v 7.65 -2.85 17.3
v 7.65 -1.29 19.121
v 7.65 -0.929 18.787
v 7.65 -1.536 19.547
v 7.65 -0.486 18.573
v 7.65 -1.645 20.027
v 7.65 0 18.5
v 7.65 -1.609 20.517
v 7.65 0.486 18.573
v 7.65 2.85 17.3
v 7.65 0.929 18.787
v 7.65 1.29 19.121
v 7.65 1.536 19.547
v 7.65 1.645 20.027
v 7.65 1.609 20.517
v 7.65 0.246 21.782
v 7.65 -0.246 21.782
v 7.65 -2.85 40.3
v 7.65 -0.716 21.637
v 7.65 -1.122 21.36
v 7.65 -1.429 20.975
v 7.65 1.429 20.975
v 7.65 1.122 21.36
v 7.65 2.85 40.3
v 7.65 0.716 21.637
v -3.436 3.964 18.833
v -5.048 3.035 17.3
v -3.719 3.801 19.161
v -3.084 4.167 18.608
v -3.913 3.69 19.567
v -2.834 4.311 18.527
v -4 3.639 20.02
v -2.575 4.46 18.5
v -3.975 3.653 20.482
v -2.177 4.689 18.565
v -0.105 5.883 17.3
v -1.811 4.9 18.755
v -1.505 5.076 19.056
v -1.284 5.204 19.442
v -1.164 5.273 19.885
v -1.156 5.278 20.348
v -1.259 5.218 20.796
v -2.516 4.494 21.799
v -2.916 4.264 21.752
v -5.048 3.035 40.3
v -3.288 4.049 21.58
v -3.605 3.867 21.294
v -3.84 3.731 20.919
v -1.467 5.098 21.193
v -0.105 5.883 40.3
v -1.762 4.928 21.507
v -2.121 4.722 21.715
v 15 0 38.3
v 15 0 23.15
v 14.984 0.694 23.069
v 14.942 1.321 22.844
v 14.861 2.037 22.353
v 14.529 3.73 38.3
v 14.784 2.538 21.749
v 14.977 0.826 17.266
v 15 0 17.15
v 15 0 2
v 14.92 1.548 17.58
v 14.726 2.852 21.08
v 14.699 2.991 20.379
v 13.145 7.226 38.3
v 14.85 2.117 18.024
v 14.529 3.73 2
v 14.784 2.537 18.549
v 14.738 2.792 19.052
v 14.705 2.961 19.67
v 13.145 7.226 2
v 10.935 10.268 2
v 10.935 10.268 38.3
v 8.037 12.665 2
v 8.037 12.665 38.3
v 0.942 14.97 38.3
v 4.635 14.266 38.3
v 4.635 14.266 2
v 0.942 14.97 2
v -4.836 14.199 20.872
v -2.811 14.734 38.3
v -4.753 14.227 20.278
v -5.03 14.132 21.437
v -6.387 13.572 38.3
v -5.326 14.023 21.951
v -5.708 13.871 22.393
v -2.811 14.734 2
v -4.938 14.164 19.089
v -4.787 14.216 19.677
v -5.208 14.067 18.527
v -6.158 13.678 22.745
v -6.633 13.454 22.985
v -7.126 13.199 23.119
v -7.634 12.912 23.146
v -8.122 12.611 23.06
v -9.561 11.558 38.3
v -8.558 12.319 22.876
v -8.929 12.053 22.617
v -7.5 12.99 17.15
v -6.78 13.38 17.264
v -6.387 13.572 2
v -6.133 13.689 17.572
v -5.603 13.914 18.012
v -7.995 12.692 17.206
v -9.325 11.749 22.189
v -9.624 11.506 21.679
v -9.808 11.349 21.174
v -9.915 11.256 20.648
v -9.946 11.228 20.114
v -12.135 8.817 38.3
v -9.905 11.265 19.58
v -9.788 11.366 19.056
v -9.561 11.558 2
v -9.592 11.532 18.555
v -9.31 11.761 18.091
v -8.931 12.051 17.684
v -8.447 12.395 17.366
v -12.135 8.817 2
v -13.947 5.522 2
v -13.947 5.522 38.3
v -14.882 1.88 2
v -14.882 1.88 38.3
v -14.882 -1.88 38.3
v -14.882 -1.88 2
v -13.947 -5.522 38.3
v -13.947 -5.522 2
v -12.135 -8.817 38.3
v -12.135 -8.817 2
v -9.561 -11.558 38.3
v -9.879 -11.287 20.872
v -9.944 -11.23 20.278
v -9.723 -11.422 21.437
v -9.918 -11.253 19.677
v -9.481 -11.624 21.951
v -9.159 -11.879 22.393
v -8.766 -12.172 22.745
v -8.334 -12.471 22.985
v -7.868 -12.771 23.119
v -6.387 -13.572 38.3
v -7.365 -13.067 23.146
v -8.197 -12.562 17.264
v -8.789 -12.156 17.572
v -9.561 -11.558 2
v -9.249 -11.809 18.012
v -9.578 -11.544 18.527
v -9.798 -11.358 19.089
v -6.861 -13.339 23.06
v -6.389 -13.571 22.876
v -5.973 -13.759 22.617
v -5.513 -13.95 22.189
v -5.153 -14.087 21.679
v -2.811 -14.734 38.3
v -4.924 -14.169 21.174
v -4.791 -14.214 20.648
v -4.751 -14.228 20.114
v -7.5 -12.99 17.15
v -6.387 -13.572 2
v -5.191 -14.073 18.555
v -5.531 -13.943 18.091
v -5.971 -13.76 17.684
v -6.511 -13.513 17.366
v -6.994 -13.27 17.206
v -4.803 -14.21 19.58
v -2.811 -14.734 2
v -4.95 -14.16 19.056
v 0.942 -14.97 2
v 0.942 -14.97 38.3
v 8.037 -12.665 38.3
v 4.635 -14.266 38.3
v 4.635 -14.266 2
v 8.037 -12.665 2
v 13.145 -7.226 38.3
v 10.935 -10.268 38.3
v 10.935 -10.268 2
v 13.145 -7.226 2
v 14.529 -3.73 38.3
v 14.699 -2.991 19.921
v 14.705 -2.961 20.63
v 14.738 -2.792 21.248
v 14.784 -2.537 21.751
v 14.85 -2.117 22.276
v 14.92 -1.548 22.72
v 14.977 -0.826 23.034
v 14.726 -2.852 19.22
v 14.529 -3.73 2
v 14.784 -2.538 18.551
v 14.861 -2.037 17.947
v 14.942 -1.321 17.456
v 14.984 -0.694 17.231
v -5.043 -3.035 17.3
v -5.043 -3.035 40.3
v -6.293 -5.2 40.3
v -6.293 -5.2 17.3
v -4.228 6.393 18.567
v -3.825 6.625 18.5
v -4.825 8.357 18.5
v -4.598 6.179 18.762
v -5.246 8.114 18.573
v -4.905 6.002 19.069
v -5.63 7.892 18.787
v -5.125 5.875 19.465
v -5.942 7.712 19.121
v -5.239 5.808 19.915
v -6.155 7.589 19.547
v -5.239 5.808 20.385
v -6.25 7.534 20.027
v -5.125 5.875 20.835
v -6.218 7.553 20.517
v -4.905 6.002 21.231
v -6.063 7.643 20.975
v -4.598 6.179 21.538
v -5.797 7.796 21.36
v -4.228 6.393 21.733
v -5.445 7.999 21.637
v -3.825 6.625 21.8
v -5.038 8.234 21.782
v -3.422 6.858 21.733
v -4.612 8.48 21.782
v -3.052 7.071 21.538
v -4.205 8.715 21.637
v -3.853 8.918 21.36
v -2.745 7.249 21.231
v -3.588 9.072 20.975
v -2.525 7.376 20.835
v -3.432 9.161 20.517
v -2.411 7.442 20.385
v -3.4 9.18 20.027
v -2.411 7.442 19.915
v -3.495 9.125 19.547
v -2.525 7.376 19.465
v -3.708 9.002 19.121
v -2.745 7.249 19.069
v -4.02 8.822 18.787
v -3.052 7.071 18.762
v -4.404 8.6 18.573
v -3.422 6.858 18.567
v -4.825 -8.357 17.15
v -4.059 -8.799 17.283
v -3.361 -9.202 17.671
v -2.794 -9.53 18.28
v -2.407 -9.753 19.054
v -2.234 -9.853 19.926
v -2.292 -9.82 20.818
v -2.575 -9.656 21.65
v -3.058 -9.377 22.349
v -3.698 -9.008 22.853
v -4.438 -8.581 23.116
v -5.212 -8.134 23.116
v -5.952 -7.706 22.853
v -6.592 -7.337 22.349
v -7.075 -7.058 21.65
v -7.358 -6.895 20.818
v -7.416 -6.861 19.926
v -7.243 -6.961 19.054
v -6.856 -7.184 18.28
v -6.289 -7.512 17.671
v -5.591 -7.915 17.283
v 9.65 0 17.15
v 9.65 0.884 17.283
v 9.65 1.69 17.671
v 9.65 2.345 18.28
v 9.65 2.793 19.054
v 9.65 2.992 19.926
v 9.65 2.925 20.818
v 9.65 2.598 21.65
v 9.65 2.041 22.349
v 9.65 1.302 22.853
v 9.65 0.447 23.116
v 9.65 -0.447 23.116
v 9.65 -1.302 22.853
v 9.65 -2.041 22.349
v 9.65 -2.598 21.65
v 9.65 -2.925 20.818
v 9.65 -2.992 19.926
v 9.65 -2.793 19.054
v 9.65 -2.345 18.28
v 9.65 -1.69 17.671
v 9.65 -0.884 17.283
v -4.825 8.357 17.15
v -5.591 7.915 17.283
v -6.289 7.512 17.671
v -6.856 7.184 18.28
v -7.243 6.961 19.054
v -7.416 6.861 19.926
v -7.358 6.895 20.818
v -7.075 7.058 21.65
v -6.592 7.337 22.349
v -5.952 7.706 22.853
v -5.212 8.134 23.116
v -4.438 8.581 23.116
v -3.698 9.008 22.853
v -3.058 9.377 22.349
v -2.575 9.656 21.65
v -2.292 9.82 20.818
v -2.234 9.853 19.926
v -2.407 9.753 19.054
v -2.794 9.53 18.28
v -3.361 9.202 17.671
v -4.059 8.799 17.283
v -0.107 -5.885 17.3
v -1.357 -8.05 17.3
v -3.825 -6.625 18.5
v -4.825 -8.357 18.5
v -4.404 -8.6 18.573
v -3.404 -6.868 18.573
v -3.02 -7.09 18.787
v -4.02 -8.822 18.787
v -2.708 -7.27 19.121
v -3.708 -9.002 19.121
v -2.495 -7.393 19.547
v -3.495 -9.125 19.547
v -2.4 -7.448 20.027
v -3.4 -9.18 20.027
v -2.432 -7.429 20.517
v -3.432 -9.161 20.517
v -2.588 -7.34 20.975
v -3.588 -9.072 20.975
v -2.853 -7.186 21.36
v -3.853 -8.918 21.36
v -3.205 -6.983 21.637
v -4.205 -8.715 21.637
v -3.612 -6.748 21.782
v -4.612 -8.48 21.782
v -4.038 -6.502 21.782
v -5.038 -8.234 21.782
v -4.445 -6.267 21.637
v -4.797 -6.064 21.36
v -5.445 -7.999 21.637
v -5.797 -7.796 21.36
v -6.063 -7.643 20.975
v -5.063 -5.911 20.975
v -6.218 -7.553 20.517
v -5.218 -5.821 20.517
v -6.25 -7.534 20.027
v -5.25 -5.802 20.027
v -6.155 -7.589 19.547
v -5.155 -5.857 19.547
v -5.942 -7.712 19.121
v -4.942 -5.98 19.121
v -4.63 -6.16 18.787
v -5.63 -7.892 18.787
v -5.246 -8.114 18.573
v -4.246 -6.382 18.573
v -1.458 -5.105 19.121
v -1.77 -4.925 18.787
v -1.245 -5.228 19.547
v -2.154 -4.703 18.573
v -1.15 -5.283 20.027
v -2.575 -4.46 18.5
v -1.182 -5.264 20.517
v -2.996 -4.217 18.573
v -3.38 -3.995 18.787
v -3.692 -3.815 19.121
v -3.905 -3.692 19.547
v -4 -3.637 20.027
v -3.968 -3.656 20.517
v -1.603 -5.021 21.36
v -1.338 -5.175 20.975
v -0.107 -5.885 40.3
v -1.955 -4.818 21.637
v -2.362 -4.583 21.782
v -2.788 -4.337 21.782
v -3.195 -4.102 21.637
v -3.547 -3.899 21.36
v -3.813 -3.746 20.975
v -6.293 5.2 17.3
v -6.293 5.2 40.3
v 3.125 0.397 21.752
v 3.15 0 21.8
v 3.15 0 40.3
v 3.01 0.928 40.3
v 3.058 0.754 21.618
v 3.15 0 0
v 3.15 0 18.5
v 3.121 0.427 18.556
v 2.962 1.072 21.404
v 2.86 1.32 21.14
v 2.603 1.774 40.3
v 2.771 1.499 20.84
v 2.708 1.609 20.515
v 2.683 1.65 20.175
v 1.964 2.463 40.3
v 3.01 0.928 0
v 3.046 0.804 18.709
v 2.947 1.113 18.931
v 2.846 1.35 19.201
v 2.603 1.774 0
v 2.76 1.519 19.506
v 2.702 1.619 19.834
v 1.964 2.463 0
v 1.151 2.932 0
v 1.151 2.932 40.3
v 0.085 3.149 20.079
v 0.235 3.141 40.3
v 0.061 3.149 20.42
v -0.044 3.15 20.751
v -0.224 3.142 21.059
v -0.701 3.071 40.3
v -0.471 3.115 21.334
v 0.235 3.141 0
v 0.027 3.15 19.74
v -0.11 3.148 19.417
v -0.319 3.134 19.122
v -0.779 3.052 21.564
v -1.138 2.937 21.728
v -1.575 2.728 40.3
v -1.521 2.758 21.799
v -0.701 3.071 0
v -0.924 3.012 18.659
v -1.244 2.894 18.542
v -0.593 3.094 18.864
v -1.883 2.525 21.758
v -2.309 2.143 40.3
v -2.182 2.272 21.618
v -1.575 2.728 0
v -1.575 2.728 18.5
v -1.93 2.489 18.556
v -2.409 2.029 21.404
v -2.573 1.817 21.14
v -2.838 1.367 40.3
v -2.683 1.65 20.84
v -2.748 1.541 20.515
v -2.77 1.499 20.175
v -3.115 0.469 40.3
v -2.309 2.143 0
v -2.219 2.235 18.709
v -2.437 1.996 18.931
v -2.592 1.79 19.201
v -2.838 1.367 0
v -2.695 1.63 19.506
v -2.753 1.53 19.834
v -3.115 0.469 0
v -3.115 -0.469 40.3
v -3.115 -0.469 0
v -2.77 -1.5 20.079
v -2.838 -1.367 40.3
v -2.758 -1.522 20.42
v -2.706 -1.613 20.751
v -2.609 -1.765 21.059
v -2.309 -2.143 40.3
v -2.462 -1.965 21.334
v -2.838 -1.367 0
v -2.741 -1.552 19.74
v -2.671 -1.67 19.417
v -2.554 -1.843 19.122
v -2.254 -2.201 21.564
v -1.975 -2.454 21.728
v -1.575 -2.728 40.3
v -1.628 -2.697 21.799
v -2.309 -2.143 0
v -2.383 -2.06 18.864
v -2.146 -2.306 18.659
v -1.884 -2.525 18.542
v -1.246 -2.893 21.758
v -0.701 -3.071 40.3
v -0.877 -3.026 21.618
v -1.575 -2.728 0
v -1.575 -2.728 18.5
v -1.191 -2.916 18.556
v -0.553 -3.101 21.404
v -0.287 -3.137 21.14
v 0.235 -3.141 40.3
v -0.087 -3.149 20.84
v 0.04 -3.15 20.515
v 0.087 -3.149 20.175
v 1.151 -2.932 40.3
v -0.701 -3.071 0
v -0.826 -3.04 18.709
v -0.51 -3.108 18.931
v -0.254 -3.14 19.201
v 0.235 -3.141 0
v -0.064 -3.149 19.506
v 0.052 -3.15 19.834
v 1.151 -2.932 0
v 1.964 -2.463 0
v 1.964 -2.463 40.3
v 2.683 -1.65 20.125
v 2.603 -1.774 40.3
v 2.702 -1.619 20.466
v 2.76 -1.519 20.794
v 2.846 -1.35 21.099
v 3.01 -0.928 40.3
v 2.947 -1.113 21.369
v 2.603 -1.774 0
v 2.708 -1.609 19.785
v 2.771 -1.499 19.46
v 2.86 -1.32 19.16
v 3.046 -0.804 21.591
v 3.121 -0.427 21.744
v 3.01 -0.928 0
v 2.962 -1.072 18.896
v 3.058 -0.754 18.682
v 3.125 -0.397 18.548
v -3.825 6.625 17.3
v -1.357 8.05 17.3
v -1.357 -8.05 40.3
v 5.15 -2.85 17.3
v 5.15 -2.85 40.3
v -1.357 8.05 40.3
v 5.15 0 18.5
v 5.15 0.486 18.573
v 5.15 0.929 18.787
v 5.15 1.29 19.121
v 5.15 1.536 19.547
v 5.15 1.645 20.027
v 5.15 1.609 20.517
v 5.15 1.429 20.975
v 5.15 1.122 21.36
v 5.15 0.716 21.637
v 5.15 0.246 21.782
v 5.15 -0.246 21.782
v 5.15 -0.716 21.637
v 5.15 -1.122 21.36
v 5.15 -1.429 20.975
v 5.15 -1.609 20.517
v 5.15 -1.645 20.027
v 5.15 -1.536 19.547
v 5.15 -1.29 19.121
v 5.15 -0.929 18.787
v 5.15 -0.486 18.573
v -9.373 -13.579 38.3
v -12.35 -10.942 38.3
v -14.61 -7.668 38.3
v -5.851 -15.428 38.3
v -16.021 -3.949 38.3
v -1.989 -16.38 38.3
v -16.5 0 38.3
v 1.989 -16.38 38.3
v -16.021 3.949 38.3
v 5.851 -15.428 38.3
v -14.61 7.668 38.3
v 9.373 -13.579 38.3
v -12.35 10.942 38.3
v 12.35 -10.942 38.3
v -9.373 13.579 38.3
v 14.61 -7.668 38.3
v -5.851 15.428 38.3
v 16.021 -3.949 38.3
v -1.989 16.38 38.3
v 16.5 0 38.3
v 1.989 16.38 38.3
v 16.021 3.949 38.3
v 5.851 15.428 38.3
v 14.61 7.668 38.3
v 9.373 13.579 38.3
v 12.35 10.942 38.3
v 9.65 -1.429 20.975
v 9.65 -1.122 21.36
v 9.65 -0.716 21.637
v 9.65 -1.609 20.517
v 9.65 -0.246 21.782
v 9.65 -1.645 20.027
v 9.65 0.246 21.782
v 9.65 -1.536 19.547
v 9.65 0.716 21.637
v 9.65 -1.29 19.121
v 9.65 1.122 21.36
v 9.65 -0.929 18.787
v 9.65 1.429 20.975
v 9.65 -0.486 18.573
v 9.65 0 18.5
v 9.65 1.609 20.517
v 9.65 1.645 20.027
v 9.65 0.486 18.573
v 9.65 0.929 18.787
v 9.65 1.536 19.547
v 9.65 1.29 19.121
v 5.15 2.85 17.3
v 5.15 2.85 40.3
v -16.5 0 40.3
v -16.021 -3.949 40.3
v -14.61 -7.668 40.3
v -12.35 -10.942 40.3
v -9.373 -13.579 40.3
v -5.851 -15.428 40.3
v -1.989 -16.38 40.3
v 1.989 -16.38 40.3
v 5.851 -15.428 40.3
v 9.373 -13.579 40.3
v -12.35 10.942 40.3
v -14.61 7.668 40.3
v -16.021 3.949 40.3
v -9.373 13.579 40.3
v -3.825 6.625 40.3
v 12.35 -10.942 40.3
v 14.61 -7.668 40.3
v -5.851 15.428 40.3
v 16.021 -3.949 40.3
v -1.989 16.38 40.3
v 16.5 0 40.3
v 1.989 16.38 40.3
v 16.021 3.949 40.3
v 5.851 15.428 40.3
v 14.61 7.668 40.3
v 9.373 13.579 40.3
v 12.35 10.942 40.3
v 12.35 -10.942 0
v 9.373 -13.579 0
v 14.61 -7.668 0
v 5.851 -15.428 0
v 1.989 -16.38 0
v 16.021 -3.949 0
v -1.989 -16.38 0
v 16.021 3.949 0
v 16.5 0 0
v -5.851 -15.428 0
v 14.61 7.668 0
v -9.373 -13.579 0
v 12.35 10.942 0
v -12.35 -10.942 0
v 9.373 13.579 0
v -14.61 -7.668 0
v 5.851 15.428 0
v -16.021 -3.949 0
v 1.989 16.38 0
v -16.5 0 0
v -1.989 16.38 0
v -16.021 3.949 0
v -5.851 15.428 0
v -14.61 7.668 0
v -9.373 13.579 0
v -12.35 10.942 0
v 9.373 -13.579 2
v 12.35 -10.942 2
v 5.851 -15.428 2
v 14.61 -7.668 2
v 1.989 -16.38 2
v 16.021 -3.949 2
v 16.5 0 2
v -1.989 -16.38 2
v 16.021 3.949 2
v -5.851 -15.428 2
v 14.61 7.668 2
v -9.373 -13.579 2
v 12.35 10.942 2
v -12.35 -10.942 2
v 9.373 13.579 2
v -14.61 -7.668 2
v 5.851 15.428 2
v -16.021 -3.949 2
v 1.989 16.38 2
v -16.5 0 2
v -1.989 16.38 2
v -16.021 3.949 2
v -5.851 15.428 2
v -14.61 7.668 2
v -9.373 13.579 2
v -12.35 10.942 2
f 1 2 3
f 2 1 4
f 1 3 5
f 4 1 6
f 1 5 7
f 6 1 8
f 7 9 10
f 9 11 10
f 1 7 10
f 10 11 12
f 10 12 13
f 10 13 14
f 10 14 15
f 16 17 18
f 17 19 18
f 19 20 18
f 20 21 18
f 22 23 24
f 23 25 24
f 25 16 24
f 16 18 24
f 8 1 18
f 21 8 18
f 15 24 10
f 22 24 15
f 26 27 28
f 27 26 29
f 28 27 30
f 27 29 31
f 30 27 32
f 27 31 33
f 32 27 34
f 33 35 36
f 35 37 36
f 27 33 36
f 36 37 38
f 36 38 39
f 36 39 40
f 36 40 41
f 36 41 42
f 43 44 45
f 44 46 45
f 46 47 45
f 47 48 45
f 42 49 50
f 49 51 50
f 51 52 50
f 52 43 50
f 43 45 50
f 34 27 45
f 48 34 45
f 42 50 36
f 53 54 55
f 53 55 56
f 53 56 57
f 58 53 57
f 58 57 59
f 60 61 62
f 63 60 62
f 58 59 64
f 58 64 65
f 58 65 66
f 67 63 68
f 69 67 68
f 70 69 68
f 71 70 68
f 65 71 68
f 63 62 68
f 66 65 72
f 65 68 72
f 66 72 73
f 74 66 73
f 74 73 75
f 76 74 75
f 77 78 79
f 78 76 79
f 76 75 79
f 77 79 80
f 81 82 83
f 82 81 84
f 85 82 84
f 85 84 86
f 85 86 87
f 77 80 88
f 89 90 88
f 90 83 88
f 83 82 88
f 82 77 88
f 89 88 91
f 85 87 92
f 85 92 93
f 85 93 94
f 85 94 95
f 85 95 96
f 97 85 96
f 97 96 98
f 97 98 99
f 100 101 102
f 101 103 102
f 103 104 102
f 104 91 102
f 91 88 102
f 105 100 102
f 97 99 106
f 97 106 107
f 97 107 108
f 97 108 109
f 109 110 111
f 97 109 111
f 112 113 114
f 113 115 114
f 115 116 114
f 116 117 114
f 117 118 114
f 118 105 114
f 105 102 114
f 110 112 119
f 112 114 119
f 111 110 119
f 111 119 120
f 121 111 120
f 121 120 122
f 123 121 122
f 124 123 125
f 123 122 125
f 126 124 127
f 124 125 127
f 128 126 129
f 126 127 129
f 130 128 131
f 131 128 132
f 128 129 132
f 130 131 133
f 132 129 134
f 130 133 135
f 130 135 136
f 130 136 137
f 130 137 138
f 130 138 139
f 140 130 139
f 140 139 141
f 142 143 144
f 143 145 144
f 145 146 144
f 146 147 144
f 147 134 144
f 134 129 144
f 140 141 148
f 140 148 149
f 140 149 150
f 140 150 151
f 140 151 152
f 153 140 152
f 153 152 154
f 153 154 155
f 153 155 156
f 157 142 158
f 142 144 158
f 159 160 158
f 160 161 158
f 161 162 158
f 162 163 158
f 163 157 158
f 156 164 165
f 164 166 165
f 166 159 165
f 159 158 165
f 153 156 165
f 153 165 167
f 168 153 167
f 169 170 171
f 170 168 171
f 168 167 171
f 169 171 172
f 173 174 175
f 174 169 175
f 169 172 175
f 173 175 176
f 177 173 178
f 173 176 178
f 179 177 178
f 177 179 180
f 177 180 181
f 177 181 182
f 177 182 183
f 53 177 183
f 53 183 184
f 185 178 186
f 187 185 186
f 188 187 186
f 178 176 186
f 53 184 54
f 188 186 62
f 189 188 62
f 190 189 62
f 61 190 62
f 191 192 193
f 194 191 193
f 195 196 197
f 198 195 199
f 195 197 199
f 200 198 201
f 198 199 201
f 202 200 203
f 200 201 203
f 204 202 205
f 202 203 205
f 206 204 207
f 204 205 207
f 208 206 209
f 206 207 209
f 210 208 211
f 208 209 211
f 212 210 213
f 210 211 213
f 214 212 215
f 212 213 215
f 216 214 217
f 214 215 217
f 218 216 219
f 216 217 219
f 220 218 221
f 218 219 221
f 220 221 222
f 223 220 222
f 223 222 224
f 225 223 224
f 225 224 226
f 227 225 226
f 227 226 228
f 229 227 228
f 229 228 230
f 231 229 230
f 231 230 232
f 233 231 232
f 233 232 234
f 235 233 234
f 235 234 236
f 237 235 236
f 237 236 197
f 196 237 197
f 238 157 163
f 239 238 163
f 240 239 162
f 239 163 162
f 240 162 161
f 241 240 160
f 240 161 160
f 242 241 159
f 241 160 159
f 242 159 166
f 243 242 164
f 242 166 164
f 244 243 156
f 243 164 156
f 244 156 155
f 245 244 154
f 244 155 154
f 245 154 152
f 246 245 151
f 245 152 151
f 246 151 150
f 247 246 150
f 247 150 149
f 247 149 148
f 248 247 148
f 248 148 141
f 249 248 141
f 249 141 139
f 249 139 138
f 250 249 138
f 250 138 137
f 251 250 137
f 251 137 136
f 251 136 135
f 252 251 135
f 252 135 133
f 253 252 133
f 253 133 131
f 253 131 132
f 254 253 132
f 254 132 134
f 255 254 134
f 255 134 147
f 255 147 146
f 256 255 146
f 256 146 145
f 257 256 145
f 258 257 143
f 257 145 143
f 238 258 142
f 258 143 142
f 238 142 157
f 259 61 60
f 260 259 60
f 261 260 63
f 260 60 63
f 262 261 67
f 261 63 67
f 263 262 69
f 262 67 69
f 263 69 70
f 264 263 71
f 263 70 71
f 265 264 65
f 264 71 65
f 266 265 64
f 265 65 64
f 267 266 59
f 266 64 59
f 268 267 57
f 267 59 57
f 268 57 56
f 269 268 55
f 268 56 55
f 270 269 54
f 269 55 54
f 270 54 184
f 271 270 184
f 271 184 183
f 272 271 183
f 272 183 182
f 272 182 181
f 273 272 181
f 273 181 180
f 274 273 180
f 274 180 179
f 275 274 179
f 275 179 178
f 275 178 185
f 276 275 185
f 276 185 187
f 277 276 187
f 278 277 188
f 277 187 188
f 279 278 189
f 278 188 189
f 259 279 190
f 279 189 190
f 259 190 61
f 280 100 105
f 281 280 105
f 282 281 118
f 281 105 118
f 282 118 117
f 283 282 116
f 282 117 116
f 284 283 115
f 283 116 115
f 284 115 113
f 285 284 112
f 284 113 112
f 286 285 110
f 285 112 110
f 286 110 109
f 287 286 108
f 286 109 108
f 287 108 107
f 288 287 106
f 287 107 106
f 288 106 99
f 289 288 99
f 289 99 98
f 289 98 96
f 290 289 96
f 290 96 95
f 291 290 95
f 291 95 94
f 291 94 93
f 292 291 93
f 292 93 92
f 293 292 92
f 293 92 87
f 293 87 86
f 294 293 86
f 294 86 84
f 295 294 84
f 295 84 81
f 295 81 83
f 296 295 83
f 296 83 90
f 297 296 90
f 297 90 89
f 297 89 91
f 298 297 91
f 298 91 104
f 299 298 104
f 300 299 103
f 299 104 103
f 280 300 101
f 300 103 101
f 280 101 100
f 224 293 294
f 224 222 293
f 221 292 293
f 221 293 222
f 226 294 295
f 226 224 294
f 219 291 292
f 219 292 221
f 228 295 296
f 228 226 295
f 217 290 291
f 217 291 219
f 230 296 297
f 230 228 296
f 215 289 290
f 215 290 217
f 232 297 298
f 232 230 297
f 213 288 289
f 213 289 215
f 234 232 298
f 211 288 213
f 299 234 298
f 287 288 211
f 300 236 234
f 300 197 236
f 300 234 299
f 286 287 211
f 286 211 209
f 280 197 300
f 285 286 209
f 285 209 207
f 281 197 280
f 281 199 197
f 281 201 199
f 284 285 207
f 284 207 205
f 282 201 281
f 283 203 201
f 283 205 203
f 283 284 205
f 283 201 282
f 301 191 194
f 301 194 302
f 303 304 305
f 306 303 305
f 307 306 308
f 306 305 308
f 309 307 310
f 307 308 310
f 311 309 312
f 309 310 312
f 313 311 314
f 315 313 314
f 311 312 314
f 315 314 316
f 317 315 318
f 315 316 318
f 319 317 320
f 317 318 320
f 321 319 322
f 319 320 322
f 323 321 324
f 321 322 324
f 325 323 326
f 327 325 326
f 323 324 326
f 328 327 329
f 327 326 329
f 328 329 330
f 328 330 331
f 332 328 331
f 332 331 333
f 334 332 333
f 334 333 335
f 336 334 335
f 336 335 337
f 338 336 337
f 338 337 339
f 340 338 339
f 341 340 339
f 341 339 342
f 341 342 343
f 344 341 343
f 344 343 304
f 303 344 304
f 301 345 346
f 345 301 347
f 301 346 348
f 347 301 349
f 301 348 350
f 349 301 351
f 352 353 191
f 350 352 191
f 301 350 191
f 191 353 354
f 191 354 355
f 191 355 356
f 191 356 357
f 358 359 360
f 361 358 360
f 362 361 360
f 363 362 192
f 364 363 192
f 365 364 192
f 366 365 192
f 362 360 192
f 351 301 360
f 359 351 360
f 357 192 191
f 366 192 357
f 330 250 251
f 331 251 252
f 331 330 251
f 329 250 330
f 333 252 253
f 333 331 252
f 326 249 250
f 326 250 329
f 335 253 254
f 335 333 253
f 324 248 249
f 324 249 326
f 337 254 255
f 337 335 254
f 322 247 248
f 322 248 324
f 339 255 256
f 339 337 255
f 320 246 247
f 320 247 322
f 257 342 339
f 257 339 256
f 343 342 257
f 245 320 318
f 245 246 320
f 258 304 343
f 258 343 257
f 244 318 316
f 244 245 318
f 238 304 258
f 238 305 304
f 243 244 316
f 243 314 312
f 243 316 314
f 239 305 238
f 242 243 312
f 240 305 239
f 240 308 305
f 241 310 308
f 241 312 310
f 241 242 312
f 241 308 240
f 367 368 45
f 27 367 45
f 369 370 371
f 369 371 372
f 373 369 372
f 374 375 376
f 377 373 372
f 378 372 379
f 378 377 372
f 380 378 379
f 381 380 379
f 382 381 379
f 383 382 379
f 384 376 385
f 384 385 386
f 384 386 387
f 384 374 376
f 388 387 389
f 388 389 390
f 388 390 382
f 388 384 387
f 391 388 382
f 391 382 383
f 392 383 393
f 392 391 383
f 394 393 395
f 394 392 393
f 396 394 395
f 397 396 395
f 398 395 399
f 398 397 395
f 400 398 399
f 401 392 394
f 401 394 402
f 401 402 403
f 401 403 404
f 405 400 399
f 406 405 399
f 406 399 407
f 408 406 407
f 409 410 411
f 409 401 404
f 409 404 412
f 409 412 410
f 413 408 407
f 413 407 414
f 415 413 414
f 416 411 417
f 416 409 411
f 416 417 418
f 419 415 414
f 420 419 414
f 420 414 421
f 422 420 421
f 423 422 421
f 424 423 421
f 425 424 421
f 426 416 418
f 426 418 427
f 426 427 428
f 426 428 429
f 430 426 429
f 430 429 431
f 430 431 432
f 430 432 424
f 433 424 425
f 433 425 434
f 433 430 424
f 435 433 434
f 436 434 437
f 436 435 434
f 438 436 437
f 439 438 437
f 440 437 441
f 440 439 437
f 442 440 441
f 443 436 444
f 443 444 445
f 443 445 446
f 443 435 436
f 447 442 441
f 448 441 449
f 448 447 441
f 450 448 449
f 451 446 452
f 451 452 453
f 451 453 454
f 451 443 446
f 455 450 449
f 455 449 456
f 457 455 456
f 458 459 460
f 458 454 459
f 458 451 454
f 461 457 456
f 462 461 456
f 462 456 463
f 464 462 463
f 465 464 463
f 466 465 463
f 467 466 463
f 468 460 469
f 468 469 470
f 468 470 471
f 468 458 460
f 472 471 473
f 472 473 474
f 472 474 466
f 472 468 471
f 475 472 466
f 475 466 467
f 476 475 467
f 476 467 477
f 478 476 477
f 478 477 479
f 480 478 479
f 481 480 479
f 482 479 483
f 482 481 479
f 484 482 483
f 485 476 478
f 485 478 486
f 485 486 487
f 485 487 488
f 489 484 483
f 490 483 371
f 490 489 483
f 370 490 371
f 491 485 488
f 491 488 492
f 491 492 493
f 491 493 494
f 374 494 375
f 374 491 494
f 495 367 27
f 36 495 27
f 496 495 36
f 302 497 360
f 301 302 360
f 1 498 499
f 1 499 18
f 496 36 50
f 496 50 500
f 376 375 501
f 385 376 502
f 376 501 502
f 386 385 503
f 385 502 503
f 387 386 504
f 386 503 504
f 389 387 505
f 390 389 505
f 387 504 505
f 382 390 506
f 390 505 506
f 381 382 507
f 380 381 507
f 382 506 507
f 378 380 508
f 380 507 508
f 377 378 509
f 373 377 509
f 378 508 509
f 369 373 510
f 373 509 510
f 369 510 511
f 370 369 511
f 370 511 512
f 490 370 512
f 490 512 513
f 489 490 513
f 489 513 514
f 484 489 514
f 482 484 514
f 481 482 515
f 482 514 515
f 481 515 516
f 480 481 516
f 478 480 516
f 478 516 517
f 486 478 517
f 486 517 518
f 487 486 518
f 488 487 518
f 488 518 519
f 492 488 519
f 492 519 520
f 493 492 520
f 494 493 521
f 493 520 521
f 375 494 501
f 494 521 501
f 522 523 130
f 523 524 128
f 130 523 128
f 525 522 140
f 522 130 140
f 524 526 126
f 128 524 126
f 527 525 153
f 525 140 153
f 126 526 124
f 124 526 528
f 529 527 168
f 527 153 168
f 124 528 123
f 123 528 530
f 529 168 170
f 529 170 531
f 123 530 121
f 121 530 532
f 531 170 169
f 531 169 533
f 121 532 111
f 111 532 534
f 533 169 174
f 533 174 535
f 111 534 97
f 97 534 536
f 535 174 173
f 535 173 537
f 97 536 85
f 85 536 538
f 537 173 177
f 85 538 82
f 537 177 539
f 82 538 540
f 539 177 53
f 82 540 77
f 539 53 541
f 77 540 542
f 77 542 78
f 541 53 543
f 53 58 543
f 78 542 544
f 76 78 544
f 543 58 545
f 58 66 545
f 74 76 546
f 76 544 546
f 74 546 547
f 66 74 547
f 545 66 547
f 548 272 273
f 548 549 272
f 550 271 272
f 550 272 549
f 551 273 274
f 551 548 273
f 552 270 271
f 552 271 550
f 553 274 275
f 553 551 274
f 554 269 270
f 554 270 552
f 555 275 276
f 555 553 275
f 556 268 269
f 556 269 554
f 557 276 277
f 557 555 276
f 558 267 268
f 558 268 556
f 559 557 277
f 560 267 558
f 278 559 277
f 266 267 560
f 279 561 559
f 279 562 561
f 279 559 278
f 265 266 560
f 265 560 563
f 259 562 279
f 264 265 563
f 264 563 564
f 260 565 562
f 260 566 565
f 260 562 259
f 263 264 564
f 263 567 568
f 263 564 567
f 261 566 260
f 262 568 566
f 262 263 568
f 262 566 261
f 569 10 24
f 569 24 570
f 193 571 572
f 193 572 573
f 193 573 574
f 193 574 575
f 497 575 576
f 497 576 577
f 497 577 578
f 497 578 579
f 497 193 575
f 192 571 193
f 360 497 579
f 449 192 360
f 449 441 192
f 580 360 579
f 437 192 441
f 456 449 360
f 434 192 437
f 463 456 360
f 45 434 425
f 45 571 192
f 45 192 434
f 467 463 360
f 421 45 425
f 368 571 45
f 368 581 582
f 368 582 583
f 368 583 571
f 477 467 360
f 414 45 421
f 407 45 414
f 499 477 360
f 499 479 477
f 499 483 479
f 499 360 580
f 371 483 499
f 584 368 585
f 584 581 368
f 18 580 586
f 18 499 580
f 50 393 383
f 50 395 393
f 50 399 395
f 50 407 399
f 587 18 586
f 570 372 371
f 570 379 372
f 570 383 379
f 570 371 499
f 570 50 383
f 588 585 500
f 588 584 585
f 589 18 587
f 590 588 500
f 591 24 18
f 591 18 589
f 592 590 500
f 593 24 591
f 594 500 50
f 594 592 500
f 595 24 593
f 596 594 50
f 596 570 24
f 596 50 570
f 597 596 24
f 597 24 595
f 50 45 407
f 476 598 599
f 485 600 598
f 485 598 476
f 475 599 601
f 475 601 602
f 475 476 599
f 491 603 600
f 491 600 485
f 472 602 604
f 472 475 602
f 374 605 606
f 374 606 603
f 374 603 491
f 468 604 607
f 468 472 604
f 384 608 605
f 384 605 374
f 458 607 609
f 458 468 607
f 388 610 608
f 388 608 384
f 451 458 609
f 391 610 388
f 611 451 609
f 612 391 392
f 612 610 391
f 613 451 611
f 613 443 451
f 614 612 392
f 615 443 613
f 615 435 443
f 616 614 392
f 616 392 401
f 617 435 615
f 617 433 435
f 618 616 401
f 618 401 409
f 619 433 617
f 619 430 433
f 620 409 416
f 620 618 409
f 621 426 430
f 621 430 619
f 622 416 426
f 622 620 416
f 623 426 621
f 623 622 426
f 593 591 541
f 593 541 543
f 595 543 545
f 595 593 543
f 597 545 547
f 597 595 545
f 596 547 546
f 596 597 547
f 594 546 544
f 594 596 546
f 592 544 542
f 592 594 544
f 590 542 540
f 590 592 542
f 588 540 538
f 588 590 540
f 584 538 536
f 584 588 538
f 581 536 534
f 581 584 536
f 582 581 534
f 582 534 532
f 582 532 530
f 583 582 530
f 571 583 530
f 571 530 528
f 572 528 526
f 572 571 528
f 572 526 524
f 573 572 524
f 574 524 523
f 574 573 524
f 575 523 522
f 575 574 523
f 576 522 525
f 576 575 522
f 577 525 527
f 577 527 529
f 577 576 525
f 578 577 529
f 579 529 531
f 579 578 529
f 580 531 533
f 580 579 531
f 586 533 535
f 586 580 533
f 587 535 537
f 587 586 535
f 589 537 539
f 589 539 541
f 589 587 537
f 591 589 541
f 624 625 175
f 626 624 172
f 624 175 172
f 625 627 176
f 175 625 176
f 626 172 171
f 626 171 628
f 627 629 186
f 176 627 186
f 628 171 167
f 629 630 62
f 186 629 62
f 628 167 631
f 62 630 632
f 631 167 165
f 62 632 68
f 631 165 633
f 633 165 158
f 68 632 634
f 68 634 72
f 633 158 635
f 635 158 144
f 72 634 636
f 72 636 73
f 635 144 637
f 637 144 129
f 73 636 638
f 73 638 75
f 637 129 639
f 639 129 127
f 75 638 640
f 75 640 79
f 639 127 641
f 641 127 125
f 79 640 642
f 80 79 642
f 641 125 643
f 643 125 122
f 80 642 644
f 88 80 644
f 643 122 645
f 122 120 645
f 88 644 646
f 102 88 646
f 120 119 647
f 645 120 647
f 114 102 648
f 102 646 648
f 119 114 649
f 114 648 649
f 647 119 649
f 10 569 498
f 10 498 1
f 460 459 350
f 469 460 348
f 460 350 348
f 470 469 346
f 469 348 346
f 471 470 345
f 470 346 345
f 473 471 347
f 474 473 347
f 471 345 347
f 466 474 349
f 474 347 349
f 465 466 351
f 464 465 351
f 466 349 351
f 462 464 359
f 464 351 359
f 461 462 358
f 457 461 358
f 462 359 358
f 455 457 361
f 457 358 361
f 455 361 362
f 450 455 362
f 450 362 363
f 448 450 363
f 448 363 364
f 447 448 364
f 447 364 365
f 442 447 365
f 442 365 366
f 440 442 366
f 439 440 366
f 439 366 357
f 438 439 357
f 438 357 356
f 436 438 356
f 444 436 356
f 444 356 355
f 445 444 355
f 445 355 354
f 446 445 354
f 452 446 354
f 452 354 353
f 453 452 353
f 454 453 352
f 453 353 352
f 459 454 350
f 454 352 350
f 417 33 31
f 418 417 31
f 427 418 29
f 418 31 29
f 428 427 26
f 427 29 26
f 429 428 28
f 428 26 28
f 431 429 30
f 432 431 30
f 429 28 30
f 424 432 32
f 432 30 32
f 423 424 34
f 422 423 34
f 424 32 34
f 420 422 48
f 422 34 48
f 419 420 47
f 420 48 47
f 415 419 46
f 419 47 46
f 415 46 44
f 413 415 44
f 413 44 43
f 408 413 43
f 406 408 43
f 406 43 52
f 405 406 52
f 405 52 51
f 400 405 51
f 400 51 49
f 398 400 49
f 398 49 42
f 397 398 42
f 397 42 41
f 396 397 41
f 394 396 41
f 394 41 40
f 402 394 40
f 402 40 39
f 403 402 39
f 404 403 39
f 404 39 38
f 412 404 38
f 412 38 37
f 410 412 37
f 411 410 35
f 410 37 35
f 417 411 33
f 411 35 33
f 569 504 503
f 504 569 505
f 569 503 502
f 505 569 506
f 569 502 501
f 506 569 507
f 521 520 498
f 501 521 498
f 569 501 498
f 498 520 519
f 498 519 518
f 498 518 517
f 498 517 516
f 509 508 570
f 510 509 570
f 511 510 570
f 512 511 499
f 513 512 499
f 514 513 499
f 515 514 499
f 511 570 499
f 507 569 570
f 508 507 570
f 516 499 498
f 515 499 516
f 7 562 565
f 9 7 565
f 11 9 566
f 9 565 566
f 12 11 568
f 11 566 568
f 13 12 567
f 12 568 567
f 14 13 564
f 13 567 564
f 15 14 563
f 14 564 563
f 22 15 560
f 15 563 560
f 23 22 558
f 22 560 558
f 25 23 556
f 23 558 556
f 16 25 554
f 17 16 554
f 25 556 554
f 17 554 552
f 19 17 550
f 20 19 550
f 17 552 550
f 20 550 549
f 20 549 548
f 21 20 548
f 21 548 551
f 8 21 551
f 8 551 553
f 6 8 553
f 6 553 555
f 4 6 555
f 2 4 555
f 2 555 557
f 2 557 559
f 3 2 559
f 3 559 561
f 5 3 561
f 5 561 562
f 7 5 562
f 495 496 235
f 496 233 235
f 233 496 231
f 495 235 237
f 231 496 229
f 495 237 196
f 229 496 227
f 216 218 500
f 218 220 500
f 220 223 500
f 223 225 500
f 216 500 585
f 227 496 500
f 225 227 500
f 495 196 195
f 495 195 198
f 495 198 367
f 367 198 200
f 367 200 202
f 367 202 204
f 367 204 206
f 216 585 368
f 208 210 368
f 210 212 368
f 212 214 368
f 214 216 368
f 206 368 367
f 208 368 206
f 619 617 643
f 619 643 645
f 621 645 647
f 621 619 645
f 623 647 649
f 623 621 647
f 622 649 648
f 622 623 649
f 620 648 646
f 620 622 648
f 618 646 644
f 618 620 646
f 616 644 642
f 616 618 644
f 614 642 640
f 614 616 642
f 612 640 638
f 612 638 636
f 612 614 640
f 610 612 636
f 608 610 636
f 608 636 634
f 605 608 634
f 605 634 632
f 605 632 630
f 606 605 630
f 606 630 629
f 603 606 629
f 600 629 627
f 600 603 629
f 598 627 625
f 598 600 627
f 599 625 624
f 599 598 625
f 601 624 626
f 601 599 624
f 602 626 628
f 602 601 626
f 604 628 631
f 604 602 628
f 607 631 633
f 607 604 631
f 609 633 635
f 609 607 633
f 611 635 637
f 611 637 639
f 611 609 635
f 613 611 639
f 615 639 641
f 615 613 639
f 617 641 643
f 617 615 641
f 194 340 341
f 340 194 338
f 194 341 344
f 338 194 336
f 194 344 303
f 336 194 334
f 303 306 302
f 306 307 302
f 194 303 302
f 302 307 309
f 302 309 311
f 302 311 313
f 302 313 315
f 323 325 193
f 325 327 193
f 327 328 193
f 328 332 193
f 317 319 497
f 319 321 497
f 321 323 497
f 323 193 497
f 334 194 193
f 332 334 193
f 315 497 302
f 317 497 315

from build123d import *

# Parameters (mm, degrees)
SKETCH1_R           = 15
SKETCH1_R_2         = 3.15
BOSS_EXTRUDE1_DEPTH = 40.3
CUT_EXTRUDE1_DEPTH  = 23
CUT_EXTRUDE4_REACH  = 37.49
SKETCH8_R           = 1.65
CUT_EXTRUDE5_REACH  = 37.49
SKETCH10_R          = 1.65
SKETCH12_R          = 3
CUT_EXTRUDE6_DEPTH  = 5.35
SKETCH15_R          = 3
CUT_EXTRUDE8_DEPTH  = 5.35
CUT_EXTRUDE9_REACH  = 37.49
SKETCH17_R          = 1.65
CUT_EXTRUDE10_REACH = 37.49
SKETCH18_R          = 1.65
SKETCH19_R          = 3
CUT_EXTRUDE11_DEPTH = 5.35
CUT_EXTRUDE12_REACH = 32
SKETCH20_R          = 1.65
CUT_EXTRUDE13_REACH = 32
SKETCH21_R          = 1.65
SKETCH22_R          = 16.5
SKETCH22_R_2        = 3.15
SKETCH22_W          = 2.5
SKETCH22_H          = 5.7
BOSS_EXTRUDE3_DEPTH = 2
SKETCH23_R          = 16.5
SKETCH23_R_2        = 3.15
BOSS_EXTRUDE4_DEPTH = 2


with BuildPart() as part:
    # Sketch1 → Boss-Extrude1 (new body)
    with BuildSketch(Plane.XY):
        Circle(SKETCH1_R)
        Circle(SKETCH1_R_2, mode=Mode.SUBTRACT)
    extrude(amount=BOSS_EXTRUDE1_DEPTH)

    # Sketch2 → Cut-Extrude1 (cut)
    with BuildSketch(Plane.XY.offset(40.3)):
        Polygon((7.65, 0), (7.65, 2.85), (5.15, 2.85), (5.15, -2.85), (7.65, -2.85), align=None)
        Polygon((-3.825, -6.625094339), (-1.356827599, -8.050094339), (-0.106827599, -5.885030829), (-5.043172401, -3.035030829), (-6.293172401, -5.200094339), align=None)
        Polygon((-3.825, 6.625094339), (-6.293172401, 5.200094339), (-5.048242412, 3.035349353), (-0.105426694, 5.882604512), (-1.356827546, 8.050094369), align=None)
    extrude(amount=-CUT_EXTRUDE1_DEPTH, mode=Mode.SUBTRACT)

    # Sketch8 → Cut-Extrude4 (cut, up to next)
    with BuildSketch(Plane(origin=(-7.5, -12.990381057, 0), x_dir=(0, 0, -1), z_dir=(-0.5, -0.866025404, 0)), mode=Mode.PRIVATE) as cut_extrude4_sk1:
        with Locations((-20.15, 0)):
            Circle(SKETCH8_R)
    cut_extrude4_tool1 = extrude(cut_extrude4_sk1.sketch, amount=-CUT_EXTRUDE4_REACH, mode=Mode.PRIVATE) & part.part
    add(cut_extrude4_tool1.solids().sort_by_distance((-7.5, -12.990381, 20.15))[0], mode=Mode.SUBTRACT)

    # Sketch10 → Cut-Extrude5 (cut, up to next)
    with BuildSketch(Plane(origin=(-7.5, -12.990381057, 0), x_dir=(0, 0, -1), z_dir=(-0.5, -0.866025404, 0)), mode=Mode.PRIVATE) as cut_extrude5_sk1:
        with Locations((-20.15, 0)):
            Circle(SKETCH10_R)
    cut_extrude5_tool1 = extrude(cut_extrude5_sk1.sketch, amount=-CUT_EXTRUDE5_REACH, mode=Mode.PRIVATE) & part.part
    add(cut_extrude5_tool1.solids().sort_by_distance((-7.5, -12.990381, 20.15))[0], mode=Mode.SUBTRACT)

    # Sketch12 → Cut-Extrude6 (cut)
    with BuildSketch(Plane(origin=(-7.5, -12.990381057, 0), x_dir=(0, 0, -1), z_dir=(-0.5, -0.866025404, 0))):
        with Locations((-20.15, 0)):
            Circle(SKETCH12_R)
    extrude(amount=-CUT_EXTRUDE6_DEPTH, mode=Mode.SUBTRACT)

    # Sketch15 → Cut-Extrude8 (cut)
    with BuildSketch(Plane(origin=(-7.5, 12.990381057, 0), x_dir=(0, 0, -1), z_dir=(-0.5, 0.866025404, 0))):
        with Locations((-20.15, 0)):
            Circle(SKETCH15_R)
    extrude(amount=-CUT_EXTRUDE8_DEPTH, mode=Mode.SUBTRACT)

    # Sketch17 → Cut-Extrude9 (cut, up to next)
    with BuildSketch(Plane(origin=(-7.5, 12.990381057, 0), x_dir=(0, 0, -1), z_dir=(-0.5, 0.866025404, 0)), mode=Mode.PRIVATE) as cut_extrude9_sk1:
        with Locations((-20.15, 0)):
            Circle(SKETCH17_R)
    cut_extrude9_tool1 = extrude(cut_extrude9_sk1.sketch, amount=-CUT_EXTRUDE9_REACH, mode=Mode.PRIVATE) & part.part
    add(cut_extrude9_tool1.solids().sort_by_distance((-7.5, 12.990381, 20.15))[0], mode=Mode.SUBTRACT)

    # Sketch18 → Cut-Extrude10 (cut, up to next)
    with BuildSketch(Plane(origin=(-7.5, 12.990381057, 0), x_dir=(0, 0, -1), z_dir=(-0.5, 0.866025404, 0)), mode=Mode.PRIVATE) as cut_extrude10_sk1:
        with Locations((-20.15, 0)):
            Circle(SKETCH18_R)
    cut_extrude10_tool1 = extrude(cut_extrude10_sk1.sketch, amount=-CUT_EXTRUDE10_REACH, mode=Mode.PRIVATE) & part.part
    add(cut_extrude10_tool1.solids().sort_by_distance((-7.5, 12.990381, 20.15))[0], mode=Mode.SUBTRACT)

    # Sketch19 → Cut-Extrude11 (cut)
    with BuildSketch(Plane(origin=(15, 0, 0), x_dir=(0, 0, -1), z_dir=(1, 0, 0))):
        with Locations((-20.15, 0)):
            Circle(SKETCH19_R)
    extrude(amount=-CUT_EXTRUDE11_DEPTH, mode=Mode.SUBTRACT)

    # Sketch20 → Cut-Extrude12 (cut, up to next)
    with BuildSketch(Plane(origin=(15, 0, 0), x_dir=(0, 0, -1), z_dir=(1, 0, 0)), mode=Mode.PRIVATE) as cut_extrude12_sk1:
        with Locations((-20.15, 0)):
            Circle(SKETCH20_R)
    cut_extrude12_tool1 = extrude(cut_extrude12_sk1.sketch, amount=-CUT_EXTRUDE12_REACH, mode=Mode.PRIVATE) & part.part
    add(cut_extrude12_tool1.solids().sort_by_distance((15, 0, 20.15))[0], mode=Mode.SUBTRACT)

    # Sketch21 → Cut-Extrude13 (cut, up to next)
    with BuildSketch(Plane(origin=(15, 0, 0), x_dir=(0, 0, -1), z_dir=(1, 0, 0)), mode=Mode.PRIVATE) as cut_extrude13_sk1:
        with Locations((-20.15, 0)):
            Circle(SKETCH21_R)
    cut_extrude13_tool1 = extrude(cut_extrude13_sk1.sketch, amount=-CUT_EXTRUDE13_REACH, mode=Mode.PRIVATE) & part.part
    add(cut_extrude13_tool1.solids().sort_by_distance((15, 0, 20.15))[0], mode=Mode.SUBTRACT)

    # Sketch22 → Boss-Extrude3 (add)
    with BuildSketch(Plane.XY.offset(40.3)):
        Circle(SKETCH22_R)
        Circle(SKETCH22_R_2, mode=Mode.SUBTRACT)
        Polygon((-1.356827599, -8.050094339), (-0.106827599, -5.885030829), (-5.043172401, -3.035030829), (-6.293172401, -5.200094339), align=None, mode=Mode.SUBTRACT)
        with Locations((6.4, 0)):
            Rectangle(SKETCH22_W, SKETCH22_H, mode=Mode.SUBTRACT)
        Polygon((-5.048242412, 3.035349353), (-0.105426694, 5.882604512), (-1.356827546, 8.050094369), (-6.293172401, 5.200094339), align=None, mode=Mode.SUBTRACT)
    extrude(amount=-BOSS_EXTRUDE3_DEPTH)

    # Sketch23 → Boss-Extrude4 (add)
    with BuildSketch(Plane(origin=(0, 0, 0), x_dir=(-1, 0, 0), z_dir=(0, 0, -1))):
        Circle(SKETCH23_R)
        Circle(SKETCH23_R_2, mode=Mode.SUBTRACT)
    extrude(amount=-BOSS_EXTRUDE4_DEPTH)


solid = part.part
